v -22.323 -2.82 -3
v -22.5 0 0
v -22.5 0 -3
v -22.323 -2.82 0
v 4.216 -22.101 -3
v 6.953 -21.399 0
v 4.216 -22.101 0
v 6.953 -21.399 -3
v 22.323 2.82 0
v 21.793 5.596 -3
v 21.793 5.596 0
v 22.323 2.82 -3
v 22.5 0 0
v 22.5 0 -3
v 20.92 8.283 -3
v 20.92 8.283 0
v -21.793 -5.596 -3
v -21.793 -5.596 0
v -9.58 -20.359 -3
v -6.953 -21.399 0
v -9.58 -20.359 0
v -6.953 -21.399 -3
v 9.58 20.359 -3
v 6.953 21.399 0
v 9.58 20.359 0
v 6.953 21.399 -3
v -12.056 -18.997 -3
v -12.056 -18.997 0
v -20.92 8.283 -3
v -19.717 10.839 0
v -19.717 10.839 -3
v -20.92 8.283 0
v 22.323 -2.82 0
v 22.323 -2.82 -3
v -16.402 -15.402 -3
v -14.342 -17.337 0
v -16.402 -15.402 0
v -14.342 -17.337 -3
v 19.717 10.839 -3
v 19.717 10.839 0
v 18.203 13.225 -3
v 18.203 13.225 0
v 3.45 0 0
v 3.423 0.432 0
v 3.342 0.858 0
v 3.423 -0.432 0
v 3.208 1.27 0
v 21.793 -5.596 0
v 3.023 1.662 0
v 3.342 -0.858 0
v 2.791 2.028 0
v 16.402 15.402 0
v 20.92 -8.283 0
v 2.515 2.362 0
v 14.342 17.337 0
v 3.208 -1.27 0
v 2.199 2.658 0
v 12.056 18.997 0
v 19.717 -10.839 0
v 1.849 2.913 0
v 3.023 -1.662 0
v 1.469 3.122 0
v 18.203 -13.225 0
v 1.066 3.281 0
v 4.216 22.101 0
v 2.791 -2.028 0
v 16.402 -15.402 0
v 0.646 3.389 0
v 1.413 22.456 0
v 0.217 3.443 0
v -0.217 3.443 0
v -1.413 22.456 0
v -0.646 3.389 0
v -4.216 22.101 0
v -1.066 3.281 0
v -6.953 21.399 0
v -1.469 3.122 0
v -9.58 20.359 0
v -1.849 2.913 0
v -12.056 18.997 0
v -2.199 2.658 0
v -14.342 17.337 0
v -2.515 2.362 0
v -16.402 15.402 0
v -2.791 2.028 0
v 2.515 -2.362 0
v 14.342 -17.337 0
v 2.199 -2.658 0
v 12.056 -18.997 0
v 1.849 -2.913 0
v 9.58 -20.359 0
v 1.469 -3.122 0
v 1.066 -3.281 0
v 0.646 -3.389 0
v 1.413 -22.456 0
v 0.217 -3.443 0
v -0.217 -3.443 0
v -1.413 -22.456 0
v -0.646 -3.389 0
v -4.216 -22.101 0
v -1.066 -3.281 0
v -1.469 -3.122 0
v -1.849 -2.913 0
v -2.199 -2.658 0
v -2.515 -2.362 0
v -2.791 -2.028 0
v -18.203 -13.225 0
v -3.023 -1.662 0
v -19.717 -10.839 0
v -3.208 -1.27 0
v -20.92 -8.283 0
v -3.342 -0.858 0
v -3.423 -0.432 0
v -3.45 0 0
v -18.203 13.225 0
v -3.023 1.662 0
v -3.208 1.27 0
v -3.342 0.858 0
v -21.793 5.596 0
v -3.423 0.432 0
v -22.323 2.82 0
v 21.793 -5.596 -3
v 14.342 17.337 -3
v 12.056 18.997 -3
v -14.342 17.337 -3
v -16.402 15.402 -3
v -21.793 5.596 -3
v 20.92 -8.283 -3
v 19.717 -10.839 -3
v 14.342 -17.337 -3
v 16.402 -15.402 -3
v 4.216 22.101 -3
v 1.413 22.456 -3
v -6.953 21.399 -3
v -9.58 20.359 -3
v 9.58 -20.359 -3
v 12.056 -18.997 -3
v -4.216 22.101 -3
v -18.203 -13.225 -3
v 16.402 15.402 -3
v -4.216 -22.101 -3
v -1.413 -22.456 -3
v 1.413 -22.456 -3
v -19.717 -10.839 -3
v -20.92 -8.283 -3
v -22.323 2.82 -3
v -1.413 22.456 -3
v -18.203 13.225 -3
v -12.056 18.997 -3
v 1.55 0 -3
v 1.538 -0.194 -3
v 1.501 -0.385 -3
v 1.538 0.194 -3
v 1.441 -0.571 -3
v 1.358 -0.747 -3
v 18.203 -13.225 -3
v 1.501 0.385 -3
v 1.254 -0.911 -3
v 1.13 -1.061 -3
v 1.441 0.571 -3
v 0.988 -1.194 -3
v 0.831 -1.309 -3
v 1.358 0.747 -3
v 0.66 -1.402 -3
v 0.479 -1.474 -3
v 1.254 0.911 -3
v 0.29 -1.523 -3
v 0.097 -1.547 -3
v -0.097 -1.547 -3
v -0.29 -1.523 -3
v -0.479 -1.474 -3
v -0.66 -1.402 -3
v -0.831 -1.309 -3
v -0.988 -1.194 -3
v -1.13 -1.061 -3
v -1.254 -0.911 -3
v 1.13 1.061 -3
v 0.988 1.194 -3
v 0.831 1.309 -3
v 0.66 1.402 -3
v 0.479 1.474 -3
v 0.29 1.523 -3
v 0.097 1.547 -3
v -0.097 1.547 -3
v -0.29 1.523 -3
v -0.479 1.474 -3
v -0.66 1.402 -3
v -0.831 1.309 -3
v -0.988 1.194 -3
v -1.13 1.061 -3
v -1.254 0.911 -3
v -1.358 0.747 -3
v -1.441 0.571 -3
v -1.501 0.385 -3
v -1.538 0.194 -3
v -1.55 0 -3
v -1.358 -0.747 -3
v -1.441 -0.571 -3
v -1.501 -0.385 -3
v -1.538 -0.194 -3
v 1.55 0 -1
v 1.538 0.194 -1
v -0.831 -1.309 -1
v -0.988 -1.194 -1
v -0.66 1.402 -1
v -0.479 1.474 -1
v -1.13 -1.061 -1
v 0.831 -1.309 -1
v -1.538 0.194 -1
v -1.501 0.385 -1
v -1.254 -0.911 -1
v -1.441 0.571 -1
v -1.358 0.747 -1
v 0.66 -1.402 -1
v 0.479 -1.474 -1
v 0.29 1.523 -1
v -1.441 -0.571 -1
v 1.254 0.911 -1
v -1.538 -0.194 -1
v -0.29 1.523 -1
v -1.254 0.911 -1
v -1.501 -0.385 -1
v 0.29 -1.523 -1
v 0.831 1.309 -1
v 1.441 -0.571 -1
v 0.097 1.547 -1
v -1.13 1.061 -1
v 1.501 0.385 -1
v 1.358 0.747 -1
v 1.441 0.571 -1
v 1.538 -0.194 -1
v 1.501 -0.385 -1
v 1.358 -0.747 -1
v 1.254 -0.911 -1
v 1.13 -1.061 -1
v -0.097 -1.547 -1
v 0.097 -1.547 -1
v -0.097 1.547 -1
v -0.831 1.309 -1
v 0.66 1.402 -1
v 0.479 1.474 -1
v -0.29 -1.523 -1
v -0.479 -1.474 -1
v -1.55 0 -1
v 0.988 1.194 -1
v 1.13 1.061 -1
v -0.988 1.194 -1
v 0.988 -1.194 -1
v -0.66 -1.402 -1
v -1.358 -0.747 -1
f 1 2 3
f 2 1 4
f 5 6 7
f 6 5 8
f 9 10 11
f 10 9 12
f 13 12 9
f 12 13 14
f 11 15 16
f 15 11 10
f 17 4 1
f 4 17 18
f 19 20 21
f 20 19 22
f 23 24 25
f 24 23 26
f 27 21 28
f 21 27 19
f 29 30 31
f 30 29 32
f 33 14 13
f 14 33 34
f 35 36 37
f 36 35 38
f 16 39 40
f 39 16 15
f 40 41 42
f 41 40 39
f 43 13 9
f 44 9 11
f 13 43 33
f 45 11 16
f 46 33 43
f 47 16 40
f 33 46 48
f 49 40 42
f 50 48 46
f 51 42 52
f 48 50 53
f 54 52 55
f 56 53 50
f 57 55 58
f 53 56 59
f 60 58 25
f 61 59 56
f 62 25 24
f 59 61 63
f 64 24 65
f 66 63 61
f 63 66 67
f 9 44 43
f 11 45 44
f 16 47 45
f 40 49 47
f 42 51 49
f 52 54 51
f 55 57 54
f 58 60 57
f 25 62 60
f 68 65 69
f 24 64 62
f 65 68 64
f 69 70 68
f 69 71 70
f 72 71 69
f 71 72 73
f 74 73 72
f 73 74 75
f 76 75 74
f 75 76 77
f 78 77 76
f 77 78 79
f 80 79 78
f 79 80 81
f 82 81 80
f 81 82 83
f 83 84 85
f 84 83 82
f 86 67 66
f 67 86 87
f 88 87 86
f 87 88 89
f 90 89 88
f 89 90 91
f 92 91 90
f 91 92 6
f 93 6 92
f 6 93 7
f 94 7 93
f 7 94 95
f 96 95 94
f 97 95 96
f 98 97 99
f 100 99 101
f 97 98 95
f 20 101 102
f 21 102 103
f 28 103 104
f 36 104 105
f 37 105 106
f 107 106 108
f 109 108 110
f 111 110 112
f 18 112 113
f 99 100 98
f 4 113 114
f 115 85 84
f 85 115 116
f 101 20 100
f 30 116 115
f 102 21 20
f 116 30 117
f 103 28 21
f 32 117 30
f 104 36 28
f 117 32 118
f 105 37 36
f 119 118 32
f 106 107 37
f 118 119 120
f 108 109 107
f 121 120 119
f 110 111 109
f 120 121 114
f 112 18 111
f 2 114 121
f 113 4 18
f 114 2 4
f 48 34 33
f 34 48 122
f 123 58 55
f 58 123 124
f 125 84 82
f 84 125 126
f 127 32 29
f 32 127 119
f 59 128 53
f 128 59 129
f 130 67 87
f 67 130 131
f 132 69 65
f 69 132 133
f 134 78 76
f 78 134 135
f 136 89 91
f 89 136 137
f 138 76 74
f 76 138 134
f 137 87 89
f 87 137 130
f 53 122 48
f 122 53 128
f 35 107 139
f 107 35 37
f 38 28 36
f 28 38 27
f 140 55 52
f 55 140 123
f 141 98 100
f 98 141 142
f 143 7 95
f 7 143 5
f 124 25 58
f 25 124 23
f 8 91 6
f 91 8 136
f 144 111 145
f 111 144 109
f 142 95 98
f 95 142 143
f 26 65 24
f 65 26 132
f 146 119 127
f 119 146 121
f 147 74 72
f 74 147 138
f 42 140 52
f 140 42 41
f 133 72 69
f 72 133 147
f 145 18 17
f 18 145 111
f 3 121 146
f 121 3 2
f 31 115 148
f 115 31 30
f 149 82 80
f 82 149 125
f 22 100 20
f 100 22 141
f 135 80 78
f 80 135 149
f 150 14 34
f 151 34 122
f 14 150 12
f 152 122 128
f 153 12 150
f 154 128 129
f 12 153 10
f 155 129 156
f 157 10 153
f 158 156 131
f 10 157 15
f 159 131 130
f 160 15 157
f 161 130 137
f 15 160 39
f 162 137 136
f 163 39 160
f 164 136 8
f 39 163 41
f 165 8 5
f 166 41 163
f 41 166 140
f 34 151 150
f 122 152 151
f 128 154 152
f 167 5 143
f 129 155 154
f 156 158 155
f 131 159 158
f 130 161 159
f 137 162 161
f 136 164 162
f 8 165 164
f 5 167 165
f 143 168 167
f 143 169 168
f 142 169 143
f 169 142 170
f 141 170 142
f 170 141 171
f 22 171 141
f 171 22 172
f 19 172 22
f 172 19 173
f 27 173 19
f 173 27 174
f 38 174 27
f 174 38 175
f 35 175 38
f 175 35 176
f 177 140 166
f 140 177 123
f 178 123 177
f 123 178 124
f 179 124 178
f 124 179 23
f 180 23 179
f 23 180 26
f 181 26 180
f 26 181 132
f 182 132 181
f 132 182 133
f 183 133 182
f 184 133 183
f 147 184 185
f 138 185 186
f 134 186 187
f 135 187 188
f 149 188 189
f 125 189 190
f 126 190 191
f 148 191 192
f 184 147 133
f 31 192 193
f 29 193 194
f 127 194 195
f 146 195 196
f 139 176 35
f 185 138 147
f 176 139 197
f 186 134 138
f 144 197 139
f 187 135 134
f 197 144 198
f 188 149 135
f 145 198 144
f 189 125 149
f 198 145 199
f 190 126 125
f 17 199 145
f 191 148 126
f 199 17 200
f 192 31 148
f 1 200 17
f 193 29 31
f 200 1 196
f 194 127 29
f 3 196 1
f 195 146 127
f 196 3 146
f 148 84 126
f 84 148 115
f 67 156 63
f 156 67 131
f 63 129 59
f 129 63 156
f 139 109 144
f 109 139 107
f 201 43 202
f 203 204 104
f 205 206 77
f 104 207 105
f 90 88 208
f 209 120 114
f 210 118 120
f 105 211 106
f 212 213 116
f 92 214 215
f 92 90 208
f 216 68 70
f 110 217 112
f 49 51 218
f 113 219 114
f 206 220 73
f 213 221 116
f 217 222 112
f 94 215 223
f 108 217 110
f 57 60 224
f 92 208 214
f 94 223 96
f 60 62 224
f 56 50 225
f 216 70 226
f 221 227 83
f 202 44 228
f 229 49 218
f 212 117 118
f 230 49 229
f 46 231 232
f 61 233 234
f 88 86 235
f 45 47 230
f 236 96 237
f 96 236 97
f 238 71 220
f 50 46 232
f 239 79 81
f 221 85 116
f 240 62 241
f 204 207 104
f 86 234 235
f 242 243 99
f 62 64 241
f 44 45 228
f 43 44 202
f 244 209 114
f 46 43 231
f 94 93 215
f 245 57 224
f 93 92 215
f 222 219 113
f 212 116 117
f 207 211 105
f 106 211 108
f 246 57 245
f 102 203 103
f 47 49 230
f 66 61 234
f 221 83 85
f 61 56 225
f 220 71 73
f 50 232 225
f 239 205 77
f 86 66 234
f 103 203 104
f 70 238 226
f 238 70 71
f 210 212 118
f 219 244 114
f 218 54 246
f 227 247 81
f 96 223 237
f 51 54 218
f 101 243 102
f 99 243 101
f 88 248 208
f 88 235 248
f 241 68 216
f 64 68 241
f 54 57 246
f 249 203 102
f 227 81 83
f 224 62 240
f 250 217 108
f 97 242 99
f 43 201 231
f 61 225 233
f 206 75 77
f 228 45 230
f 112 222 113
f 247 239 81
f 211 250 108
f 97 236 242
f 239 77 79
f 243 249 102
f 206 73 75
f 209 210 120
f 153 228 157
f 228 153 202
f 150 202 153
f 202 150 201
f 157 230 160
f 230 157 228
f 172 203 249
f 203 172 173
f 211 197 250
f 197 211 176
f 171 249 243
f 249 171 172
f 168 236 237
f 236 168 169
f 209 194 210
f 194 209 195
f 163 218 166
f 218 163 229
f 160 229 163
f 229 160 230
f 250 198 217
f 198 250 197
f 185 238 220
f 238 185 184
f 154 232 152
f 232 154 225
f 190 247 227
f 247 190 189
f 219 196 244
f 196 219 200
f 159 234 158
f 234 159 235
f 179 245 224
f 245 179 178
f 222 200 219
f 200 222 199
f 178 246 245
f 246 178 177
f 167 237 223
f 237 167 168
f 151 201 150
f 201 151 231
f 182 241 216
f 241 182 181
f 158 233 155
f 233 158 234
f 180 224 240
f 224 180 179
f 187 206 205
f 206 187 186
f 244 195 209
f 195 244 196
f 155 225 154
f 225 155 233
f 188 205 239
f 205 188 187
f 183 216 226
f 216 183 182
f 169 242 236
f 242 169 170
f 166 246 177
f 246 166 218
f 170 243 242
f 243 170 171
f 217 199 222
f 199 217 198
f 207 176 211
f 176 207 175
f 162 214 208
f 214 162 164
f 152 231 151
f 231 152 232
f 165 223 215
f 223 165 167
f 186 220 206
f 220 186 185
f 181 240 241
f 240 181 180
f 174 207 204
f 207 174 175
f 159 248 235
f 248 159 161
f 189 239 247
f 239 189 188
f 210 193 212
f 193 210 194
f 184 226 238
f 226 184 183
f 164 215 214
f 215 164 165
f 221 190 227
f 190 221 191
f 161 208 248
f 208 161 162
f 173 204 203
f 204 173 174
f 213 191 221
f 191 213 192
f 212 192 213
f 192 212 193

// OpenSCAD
$fn = 50;


difference() {
	union() {
		translate(v = [0, 0, -3.0000000000]) {
			cylinder(h = 3, r = 22.5000000000);
		}
		translate(v = [0, 0, -3.0000000000]) {
			cylinder(h = 3, r = 2.8750000000);
		}
	}
	union() {
		translate(v = [0, 0, 0]) {
			rotate(a = [0, 0, 0]) {
				difference() {
					union() {
						translate(v = [0, 0, -3.0000000000]) {
							cylinder(h = 3, r = 1.2500000000);
						}
						translate(v = [0, 0, -1.0000000000]) {
							cylinder(h = 1.0000000000, r1 = 1.5500000000, r2 = 3.4500000000);
						}
						translate(v = [0, 0, -3.0000000000]) {
							cylinder(h = 3, r = 1.5500000000);
						}
						translate(v = [0, 0, -3.0000000000]) {
							cylinder(h = 3, r = 1.2500000000);
						}
					}
					union();
				}
			}
		}
	}
}
